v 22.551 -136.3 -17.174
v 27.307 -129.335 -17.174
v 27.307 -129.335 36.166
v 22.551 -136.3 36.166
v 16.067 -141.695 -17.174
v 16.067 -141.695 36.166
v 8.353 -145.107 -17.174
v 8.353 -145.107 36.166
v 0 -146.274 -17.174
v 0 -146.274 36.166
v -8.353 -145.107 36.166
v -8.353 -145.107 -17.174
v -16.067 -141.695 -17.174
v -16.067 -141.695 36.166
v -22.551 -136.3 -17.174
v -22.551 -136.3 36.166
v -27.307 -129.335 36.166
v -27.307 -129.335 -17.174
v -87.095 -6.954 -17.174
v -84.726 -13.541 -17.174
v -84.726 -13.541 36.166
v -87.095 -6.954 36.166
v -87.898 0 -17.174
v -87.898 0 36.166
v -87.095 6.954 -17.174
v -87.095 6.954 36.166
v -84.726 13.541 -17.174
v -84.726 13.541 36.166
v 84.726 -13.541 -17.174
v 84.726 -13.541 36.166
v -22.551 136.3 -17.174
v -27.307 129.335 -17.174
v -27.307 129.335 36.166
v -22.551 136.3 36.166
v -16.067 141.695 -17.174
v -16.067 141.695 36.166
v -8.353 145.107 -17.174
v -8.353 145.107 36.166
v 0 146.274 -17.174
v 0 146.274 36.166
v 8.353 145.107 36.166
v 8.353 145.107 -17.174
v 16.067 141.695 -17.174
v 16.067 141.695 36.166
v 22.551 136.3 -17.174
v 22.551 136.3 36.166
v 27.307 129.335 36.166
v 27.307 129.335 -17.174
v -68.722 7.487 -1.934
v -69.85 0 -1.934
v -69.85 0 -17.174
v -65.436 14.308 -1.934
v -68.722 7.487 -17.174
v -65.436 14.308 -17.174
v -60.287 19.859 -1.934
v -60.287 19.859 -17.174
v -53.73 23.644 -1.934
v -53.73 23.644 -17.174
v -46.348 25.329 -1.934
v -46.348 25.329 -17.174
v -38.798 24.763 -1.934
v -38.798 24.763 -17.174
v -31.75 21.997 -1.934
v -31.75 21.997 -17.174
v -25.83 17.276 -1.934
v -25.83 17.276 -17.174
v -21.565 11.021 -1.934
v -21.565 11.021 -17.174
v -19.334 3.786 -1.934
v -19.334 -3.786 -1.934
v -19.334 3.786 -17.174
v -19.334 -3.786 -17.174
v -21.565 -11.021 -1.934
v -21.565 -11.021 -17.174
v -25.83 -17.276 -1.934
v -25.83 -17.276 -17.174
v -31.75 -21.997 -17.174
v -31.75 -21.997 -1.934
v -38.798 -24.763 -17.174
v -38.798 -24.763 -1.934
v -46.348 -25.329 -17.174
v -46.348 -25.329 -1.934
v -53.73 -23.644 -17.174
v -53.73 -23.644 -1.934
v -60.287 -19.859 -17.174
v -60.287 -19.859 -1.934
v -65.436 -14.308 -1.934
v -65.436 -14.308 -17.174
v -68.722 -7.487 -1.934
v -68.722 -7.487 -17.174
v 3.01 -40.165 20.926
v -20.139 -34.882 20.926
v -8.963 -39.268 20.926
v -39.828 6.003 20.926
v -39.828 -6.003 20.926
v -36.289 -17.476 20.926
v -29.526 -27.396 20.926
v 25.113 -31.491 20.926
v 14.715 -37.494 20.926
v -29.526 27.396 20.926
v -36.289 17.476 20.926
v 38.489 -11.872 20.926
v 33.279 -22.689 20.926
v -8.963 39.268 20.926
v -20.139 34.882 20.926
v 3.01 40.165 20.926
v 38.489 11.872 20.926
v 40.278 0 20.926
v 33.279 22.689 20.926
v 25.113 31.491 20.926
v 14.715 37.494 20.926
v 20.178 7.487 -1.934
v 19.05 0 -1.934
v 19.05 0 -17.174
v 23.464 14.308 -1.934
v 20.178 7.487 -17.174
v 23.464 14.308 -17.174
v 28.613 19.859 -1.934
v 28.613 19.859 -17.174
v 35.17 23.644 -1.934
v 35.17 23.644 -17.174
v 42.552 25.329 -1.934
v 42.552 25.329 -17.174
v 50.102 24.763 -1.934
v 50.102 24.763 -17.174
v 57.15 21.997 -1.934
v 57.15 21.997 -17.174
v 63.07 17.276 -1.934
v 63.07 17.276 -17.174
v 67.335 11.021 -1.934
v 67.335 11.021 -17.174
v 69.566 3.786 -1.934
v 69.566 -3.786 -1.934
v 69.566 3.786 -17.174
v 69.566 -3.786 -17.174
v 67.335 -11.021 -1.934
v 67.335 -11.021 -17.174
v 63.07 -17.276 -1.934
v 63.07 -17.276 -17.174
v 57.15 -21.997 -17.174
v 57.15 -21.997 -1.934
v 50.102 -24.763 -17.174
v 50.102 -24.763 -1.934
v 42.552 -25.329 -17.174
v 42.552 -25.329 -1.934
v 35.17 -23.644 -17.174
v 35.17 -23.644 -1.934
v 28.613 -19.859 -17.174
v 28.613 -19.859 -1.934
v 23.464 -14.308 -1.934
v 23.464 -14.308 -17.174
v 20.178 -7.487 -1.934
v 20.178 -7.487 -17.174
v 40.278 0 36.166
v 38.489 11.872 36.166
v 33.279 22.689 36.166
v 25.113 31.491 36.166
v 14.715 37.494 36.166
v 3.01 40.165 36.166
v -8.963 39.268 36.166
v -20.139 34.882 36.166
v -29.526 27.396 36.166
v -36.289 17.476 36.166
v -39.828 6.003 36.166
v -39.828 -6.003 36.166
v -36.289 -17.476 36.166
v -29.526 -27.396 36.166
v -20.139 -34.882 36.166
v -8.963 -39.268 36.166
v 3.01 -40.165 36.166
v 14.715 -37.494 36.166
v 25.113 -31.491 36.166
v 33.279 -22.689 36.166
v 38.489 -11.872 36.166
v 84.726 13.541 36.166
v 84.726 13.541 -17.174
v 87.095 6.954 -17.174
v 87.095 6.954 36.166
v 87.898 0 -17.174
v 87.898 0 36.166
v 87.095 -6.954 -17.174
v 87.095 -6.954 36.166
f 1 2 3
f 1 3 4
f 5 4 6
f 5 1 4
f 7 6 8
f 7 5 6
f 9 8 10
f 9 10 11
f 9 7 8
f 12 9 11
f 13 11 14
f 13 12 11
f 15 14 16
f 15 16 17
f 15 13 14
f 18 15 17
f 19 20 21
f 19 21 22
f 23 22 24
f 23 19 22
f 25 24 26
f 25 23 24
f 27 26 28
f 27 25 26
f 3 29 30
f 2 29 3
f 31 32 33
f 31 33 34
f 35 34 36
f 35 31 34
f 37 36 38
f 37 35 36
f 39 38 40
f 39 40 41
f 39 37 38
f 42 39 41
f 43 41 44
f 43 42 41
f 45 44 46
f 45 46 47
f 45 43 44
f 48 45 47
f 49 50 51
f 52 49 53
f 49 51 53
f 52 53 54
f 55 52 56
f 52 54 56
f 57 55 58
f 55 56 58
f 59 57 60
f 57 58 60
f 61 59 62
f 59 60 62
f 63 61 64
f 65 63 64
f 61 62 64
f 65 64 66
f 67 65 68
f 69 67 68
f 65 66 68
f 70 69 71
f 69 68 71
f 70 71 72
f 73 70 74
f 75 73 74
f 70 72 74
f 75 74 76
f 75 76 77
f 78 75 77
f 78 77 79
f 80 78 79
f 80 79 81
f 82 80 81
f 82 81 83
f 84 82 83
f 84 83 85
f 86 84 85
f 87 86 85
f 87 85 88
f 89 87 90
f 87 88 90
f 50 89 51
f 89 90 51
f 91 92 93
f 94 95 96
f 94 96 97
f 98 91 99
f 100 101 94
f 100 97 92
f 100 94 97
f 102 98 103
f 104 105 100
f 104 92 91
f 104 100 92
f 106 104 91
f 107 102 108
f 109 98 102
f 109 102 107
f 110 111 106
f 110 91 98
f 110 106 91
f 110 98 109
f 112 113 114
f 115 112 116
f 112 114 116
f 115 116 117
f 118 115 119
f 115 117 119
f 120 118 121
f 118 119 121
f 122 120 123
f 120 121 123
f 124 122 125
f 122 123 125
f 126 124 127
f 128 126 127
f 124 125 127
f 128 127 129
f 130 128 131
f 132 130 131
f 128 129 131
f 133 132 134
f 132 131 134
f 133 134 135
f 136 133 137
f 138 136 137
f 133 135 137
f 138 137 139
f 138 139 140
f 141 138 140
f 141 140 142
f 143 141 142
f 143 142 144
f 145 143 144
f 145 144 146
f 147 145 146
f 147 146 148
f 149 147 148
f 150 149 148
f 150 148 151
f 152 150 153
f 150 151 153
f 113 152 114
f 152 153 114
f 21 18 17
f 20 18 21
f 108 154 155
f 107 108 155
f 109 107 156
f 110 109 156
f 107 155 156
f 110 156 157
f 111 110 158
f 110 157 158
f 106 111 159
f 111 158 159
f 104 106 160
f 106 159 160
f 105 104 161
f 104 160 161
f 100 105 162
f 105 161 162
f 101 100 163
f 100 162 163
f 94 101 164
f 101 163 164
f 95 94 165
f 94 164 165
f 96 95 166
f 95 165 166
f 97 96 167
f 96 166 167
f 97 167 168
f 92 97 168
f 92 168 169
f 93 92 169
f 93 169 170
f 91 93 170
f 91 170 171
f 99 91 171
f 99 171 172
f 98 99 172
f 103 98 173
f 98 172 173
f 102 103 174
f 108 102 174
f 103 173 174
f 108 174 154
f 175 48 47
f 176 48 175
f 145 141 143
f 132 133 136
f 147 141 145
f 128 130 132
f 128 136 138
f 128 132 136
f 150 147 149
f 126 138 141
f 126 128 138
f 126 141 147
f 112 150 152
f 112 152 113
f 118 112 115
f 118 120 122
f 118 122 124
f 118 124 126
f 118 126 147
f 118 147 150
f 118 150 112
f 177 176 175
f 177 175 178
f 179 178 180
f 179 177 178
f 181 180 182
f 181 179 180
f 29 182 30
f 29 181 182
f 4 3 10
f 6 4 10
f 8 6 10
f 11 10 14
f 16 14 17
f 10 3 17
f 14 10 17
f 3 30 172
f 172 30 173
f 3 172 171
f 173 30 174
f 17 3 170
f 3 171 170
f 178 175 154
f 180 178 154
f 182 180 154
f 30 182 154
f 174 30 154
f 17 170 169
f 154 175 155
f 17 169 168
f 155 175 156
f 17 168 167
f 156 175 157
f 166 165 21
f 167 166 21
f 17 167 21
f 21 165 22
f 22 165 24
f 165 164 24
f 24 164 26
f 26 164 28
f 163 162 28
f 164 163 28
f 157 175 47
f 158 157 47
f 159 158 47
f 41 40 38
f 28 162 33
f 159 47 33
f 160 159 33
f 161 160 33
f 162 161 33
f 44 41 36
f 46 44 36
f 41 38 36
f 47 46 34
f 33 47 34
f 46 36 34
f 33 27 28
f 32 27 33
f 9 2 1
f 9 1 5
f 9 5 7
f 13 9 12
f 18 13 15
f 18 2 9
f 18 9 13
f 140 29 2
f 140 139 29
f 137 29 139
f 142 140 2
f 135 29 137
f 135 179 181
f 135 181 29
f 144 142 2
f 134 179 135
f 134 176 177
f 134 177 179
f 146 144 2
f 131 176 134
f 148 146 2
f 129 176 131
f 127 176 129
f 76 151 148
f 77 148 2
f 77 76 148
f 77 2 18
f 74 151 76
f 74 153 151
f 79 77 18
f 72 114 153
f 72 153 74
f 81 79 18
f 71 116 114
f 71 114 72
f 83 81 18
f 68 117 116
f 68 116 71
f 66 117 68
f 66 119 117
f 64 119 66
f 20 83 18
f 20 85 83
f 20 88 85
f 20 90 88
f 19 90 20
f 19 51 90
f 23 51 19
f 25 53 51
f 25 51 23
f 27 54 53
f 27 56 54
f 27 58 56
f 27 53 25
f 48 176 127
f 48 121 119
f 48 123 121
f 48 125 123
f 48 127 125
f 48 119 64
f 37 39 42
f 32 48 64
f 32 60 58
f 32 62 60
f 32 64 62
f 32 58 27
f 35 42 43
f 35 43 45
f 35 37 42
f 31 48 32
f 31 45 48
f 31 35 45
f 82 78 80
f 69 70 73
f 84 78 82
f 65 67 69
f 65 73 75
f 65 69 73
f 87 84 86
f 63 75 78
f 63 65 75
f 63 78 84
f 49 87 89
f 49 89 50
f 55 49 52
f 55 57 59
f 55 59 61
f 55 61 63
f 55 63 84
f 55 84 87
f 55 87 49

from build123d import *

# Parameters (mm, degrees)
BOSS_EXTRUDE1_DEPTH = 17.78
SKETCH2_R           = 13.426008181
CUT_EXTRUDE1_DEPTH  = 5.08
SCALE1_SCALE        = 1.5
SCALE2_SCALE        = 2
SKETCH3_R           = 25.4
CUT_EXTRUDE2_DEPTH  = 15.24


with BuildPart() as part:
    # Sketch1 → Boss-Extrude1 (new body)
    with BuildSketch(Plane.XY):
        with BuildLine():
            Line((-28.241863774, 4.513574723), (-9.102375691, 43.111542356))
            ThreePointArc((-9.102375691, 43.111542356), (0, 48.757967634), (9.102375691, 43.111542356))
            Line((9.102375691, 43.111542356), (28.241863774, 4.513574723))
            ThreePointArc((28.241863774, 4.513574723), (29.299488083, 0), (28.241863774, -4.513574723))
            Line((28.241863774, -4.513574723), (9.102375691, -43.111542356))
            ThreePointArc((9.102375691, -43.111542356), (0, -48.757967634), (-9.102375691, -43.111542356))
            Line((-9.102375691, -43.111542356), (-28.241863774, -4.513574723))
            ThreePointArc((-28.241863774, -4.513574723), (-29.299488083, 0), (-28.241863774, 4.513574723))
        make_face()
    extrude(amount=BOSS_EXTRUDE1_DEPTH)

    # Sketch2 → Cut-Extrude1 (cut)
    with BuildSketch(Plane.XY.offset(17.78)):
        Circle(SKETCH2_R)
    extrude(amount=-CUT_EXTRUDE1_DEPTH, mode=Mode.SUBTRACT)


with BuildPart() as part_1:
    # Scale1: scaled about (0, 0, 8.587002836)
    add(part.part.scale(SCALE1_SCALE).moved(Location((0, 0, -4.293501418))))


with BuildPart() as part_2:
    # Scale2: scaled about (0, 0, 8.587002836)
    add(part_1.part.scale(SCALE2_SCALE).moved(Location((0, 0, -8.587002836))))

    # Sketch3 → Cut-Extrude2 (cut)
    with BuildSketch(Plane(origin=(0, 0, -17.174005673), x_dir=(-1, 0, 0), z_dir=(0, 0, -1))):
        with Locations((-44.45, 0)):
            Circle(SKETCH3_R)
        with Locations((44.45, 0)):
            Circle(SKETCH3_R)
    extrude(amount=-CUT_EXTRUDE2_DEPTH, mode=Mode.SUBTRACT)


solid = part_2.part
